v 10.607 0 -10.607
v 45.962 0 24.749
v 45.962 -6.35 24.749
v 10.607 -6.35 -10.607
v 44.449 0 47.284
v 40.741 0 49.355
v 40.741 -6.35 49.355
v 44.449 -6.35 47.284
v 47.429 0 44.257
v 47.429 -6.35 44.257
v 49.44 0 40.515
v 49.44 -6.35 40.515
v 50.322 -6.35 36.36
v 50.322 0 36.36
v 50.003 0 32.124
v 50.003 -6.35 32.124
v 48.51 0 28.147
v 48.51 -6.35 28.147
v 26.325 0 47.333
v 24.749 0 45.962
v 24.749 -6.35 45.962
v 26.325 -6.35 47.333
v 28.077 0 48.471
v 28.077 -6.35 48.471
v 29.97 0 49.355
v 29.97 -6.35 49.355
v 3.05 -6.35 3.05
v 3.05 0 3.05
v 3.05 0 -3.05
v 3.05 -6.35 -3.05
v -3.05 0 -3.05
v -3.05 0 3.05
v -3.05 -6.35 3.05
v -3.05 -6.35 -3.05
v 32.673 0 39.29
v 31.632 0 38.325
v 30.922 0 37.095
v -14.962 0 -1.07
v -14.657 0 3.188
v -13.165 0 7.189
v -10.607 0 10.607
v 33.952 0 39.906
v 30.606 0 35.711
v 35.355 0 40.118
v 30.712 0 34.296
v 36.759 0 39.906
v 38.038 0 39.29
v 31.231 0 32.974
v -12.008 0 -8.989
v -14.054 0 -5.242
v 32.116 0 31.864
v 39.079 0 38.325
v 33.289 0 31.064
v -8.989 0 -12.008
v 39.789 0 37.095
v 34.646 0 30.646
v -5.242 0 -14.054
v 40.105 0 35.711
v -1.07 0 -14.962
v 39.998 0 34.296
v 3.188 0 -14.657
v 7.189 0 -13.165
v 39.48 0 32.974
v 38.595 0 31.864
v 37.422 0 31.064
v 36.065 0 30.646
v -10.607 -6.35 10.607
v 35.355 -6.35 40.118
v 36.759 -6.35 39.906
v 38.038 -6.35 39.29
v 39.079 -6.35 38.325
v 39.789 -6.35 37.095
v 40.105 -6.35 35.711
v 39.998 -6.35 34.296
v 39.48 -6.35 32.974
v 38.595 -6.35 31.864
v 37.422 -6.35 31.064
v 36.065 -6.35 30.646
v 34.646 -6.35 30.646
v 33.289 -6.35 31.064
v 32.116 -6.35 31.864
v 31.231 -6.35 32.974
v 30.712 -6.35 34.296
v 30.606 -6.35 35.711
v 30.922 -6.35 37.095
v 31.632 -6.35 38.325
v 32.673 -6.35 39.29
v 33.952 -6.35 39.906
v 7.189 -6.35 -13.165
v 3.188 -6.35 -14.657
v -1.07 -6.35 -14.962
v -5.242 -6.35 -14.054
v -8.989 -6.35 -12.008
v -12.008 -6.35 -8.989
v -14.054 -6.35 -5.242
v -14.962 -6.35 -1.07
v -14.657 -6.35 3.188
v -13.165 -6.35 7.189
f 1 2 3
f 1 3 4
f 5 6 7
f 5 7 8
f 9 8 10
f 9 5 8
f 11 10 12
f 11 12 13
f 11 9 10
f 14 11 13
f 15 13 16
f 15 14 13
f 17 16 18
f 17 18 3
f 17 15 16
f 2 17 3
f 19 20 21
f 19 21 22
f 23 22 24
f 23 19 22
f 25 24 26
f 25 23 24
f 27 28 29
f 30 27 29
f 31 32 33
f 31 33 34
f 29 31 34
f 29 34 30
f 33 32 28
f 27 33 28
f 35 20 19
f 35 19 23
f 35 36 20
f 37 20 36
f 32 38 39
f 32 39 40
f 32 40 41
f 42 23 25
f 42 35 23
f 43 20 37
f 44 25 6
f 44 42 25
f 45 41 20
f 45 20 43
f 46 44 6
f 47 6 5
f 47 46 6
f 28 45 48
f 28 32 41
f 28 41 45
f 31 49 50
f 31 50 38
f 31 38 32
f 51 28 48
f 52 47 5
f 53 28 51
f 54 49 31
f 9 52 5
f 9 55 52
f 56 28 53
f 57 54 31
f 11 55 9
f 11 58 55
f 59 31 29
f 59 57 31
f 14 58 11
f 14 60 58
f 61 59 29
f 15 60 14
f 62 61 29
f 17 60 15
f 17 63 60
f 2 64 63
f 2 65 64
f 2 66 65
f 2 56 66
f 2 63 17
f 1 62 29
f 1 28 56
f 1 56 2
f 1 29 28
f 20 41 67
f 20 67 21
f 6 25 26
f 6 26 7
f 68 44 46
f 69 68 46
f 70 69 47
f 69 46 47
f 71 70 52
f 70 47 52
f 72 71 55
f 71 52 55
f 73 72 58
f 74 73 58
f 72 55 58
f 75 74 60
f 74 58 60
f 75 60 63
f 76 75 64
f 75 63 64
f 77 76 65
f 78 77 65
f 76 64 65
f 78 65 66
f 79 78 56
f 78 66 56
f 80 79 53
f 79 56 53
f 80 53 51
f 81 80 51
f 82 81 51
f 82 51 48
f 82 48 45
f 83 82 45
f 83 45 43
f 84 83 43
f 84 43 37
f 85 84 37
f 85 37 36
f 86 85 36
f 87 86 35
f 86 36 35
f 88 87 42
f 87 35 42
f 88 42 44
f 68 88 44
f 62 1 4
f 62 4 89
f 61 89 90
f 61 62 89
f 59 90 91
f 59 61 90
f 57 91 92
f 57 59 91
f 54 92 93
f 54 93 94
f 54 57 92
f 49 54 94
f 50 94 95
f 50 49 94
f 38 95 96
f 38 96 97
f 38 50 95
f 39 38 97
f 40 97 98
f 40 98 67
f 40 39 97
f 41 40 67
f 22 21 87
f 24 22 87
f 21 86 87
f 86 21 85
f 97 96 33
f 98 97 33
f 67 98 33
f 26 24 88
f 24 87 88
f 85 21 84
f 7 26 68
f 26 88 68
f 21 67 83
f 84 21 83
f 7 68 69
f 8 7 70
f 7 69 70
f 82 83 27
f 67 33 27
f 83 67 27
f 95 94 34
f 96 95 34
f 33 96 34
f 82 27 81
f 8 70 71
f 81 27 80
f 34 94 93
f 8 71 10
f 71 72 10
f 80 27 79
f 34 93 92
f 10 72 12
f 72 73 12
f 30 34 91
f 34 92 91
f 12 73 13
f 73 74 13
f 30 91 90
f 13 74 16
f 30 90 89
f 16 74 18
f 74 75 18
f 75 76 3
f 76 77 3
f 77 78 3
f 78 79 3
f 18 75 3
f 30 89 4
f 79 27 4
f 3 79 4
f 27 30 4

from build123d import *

# Parameters (mm, degrees)
SKETCH2_R           = 4.7625
SKETCH2_W           = 6.1
SKETCH2_H           = 6.1
BOSS_EXTRUDE1_DEPTH = 6.35


with BuildPart() as part:
    # Sketch2 → Boss-Extrude1 (new body)
    with BuildSketch(Plane(origin=(0, 0, 0), x_dir=(1, 0, 0), z_dir=(0, 1, 0))):
        with BuildLine():
            Line((45.961940777, -24.748737342), (10.606601718, 10.606601718))
            ThreePointArc((10.606601718, 10.606601718), (-10.606601718, 10.606601718), (-10.606601718, -10.606601718))
            Line((-10.606601718, -10.606601718), (24.748737342, -45.961940777))
            ThreePointArc((24.748737342, -45.961940777), (27.181420958, -47.93258291), (29.970174252, -49.355339059))
            Line((29.970174252, -49.355339059), (40.740503866, -49.355339059))
            ThreePointArc((40.740503866, -49.355339059), (50.028626393, -38.468960557), (45.961940777, -24.748737342))
        make_face()
        with Locations(Location((35.355339059, -35.355339059, 0), (0, 0, 270))):
            Circle(SKETCH2_R, mode=Mode.SUBTRACT)
        Rectangle(SKETCH2_W, SKETCH2_H, mode=Mode.SUBTRACT)
    extrude(amount=-BOSS_EXTRUDE1_DEPTH)


solid = part.part
